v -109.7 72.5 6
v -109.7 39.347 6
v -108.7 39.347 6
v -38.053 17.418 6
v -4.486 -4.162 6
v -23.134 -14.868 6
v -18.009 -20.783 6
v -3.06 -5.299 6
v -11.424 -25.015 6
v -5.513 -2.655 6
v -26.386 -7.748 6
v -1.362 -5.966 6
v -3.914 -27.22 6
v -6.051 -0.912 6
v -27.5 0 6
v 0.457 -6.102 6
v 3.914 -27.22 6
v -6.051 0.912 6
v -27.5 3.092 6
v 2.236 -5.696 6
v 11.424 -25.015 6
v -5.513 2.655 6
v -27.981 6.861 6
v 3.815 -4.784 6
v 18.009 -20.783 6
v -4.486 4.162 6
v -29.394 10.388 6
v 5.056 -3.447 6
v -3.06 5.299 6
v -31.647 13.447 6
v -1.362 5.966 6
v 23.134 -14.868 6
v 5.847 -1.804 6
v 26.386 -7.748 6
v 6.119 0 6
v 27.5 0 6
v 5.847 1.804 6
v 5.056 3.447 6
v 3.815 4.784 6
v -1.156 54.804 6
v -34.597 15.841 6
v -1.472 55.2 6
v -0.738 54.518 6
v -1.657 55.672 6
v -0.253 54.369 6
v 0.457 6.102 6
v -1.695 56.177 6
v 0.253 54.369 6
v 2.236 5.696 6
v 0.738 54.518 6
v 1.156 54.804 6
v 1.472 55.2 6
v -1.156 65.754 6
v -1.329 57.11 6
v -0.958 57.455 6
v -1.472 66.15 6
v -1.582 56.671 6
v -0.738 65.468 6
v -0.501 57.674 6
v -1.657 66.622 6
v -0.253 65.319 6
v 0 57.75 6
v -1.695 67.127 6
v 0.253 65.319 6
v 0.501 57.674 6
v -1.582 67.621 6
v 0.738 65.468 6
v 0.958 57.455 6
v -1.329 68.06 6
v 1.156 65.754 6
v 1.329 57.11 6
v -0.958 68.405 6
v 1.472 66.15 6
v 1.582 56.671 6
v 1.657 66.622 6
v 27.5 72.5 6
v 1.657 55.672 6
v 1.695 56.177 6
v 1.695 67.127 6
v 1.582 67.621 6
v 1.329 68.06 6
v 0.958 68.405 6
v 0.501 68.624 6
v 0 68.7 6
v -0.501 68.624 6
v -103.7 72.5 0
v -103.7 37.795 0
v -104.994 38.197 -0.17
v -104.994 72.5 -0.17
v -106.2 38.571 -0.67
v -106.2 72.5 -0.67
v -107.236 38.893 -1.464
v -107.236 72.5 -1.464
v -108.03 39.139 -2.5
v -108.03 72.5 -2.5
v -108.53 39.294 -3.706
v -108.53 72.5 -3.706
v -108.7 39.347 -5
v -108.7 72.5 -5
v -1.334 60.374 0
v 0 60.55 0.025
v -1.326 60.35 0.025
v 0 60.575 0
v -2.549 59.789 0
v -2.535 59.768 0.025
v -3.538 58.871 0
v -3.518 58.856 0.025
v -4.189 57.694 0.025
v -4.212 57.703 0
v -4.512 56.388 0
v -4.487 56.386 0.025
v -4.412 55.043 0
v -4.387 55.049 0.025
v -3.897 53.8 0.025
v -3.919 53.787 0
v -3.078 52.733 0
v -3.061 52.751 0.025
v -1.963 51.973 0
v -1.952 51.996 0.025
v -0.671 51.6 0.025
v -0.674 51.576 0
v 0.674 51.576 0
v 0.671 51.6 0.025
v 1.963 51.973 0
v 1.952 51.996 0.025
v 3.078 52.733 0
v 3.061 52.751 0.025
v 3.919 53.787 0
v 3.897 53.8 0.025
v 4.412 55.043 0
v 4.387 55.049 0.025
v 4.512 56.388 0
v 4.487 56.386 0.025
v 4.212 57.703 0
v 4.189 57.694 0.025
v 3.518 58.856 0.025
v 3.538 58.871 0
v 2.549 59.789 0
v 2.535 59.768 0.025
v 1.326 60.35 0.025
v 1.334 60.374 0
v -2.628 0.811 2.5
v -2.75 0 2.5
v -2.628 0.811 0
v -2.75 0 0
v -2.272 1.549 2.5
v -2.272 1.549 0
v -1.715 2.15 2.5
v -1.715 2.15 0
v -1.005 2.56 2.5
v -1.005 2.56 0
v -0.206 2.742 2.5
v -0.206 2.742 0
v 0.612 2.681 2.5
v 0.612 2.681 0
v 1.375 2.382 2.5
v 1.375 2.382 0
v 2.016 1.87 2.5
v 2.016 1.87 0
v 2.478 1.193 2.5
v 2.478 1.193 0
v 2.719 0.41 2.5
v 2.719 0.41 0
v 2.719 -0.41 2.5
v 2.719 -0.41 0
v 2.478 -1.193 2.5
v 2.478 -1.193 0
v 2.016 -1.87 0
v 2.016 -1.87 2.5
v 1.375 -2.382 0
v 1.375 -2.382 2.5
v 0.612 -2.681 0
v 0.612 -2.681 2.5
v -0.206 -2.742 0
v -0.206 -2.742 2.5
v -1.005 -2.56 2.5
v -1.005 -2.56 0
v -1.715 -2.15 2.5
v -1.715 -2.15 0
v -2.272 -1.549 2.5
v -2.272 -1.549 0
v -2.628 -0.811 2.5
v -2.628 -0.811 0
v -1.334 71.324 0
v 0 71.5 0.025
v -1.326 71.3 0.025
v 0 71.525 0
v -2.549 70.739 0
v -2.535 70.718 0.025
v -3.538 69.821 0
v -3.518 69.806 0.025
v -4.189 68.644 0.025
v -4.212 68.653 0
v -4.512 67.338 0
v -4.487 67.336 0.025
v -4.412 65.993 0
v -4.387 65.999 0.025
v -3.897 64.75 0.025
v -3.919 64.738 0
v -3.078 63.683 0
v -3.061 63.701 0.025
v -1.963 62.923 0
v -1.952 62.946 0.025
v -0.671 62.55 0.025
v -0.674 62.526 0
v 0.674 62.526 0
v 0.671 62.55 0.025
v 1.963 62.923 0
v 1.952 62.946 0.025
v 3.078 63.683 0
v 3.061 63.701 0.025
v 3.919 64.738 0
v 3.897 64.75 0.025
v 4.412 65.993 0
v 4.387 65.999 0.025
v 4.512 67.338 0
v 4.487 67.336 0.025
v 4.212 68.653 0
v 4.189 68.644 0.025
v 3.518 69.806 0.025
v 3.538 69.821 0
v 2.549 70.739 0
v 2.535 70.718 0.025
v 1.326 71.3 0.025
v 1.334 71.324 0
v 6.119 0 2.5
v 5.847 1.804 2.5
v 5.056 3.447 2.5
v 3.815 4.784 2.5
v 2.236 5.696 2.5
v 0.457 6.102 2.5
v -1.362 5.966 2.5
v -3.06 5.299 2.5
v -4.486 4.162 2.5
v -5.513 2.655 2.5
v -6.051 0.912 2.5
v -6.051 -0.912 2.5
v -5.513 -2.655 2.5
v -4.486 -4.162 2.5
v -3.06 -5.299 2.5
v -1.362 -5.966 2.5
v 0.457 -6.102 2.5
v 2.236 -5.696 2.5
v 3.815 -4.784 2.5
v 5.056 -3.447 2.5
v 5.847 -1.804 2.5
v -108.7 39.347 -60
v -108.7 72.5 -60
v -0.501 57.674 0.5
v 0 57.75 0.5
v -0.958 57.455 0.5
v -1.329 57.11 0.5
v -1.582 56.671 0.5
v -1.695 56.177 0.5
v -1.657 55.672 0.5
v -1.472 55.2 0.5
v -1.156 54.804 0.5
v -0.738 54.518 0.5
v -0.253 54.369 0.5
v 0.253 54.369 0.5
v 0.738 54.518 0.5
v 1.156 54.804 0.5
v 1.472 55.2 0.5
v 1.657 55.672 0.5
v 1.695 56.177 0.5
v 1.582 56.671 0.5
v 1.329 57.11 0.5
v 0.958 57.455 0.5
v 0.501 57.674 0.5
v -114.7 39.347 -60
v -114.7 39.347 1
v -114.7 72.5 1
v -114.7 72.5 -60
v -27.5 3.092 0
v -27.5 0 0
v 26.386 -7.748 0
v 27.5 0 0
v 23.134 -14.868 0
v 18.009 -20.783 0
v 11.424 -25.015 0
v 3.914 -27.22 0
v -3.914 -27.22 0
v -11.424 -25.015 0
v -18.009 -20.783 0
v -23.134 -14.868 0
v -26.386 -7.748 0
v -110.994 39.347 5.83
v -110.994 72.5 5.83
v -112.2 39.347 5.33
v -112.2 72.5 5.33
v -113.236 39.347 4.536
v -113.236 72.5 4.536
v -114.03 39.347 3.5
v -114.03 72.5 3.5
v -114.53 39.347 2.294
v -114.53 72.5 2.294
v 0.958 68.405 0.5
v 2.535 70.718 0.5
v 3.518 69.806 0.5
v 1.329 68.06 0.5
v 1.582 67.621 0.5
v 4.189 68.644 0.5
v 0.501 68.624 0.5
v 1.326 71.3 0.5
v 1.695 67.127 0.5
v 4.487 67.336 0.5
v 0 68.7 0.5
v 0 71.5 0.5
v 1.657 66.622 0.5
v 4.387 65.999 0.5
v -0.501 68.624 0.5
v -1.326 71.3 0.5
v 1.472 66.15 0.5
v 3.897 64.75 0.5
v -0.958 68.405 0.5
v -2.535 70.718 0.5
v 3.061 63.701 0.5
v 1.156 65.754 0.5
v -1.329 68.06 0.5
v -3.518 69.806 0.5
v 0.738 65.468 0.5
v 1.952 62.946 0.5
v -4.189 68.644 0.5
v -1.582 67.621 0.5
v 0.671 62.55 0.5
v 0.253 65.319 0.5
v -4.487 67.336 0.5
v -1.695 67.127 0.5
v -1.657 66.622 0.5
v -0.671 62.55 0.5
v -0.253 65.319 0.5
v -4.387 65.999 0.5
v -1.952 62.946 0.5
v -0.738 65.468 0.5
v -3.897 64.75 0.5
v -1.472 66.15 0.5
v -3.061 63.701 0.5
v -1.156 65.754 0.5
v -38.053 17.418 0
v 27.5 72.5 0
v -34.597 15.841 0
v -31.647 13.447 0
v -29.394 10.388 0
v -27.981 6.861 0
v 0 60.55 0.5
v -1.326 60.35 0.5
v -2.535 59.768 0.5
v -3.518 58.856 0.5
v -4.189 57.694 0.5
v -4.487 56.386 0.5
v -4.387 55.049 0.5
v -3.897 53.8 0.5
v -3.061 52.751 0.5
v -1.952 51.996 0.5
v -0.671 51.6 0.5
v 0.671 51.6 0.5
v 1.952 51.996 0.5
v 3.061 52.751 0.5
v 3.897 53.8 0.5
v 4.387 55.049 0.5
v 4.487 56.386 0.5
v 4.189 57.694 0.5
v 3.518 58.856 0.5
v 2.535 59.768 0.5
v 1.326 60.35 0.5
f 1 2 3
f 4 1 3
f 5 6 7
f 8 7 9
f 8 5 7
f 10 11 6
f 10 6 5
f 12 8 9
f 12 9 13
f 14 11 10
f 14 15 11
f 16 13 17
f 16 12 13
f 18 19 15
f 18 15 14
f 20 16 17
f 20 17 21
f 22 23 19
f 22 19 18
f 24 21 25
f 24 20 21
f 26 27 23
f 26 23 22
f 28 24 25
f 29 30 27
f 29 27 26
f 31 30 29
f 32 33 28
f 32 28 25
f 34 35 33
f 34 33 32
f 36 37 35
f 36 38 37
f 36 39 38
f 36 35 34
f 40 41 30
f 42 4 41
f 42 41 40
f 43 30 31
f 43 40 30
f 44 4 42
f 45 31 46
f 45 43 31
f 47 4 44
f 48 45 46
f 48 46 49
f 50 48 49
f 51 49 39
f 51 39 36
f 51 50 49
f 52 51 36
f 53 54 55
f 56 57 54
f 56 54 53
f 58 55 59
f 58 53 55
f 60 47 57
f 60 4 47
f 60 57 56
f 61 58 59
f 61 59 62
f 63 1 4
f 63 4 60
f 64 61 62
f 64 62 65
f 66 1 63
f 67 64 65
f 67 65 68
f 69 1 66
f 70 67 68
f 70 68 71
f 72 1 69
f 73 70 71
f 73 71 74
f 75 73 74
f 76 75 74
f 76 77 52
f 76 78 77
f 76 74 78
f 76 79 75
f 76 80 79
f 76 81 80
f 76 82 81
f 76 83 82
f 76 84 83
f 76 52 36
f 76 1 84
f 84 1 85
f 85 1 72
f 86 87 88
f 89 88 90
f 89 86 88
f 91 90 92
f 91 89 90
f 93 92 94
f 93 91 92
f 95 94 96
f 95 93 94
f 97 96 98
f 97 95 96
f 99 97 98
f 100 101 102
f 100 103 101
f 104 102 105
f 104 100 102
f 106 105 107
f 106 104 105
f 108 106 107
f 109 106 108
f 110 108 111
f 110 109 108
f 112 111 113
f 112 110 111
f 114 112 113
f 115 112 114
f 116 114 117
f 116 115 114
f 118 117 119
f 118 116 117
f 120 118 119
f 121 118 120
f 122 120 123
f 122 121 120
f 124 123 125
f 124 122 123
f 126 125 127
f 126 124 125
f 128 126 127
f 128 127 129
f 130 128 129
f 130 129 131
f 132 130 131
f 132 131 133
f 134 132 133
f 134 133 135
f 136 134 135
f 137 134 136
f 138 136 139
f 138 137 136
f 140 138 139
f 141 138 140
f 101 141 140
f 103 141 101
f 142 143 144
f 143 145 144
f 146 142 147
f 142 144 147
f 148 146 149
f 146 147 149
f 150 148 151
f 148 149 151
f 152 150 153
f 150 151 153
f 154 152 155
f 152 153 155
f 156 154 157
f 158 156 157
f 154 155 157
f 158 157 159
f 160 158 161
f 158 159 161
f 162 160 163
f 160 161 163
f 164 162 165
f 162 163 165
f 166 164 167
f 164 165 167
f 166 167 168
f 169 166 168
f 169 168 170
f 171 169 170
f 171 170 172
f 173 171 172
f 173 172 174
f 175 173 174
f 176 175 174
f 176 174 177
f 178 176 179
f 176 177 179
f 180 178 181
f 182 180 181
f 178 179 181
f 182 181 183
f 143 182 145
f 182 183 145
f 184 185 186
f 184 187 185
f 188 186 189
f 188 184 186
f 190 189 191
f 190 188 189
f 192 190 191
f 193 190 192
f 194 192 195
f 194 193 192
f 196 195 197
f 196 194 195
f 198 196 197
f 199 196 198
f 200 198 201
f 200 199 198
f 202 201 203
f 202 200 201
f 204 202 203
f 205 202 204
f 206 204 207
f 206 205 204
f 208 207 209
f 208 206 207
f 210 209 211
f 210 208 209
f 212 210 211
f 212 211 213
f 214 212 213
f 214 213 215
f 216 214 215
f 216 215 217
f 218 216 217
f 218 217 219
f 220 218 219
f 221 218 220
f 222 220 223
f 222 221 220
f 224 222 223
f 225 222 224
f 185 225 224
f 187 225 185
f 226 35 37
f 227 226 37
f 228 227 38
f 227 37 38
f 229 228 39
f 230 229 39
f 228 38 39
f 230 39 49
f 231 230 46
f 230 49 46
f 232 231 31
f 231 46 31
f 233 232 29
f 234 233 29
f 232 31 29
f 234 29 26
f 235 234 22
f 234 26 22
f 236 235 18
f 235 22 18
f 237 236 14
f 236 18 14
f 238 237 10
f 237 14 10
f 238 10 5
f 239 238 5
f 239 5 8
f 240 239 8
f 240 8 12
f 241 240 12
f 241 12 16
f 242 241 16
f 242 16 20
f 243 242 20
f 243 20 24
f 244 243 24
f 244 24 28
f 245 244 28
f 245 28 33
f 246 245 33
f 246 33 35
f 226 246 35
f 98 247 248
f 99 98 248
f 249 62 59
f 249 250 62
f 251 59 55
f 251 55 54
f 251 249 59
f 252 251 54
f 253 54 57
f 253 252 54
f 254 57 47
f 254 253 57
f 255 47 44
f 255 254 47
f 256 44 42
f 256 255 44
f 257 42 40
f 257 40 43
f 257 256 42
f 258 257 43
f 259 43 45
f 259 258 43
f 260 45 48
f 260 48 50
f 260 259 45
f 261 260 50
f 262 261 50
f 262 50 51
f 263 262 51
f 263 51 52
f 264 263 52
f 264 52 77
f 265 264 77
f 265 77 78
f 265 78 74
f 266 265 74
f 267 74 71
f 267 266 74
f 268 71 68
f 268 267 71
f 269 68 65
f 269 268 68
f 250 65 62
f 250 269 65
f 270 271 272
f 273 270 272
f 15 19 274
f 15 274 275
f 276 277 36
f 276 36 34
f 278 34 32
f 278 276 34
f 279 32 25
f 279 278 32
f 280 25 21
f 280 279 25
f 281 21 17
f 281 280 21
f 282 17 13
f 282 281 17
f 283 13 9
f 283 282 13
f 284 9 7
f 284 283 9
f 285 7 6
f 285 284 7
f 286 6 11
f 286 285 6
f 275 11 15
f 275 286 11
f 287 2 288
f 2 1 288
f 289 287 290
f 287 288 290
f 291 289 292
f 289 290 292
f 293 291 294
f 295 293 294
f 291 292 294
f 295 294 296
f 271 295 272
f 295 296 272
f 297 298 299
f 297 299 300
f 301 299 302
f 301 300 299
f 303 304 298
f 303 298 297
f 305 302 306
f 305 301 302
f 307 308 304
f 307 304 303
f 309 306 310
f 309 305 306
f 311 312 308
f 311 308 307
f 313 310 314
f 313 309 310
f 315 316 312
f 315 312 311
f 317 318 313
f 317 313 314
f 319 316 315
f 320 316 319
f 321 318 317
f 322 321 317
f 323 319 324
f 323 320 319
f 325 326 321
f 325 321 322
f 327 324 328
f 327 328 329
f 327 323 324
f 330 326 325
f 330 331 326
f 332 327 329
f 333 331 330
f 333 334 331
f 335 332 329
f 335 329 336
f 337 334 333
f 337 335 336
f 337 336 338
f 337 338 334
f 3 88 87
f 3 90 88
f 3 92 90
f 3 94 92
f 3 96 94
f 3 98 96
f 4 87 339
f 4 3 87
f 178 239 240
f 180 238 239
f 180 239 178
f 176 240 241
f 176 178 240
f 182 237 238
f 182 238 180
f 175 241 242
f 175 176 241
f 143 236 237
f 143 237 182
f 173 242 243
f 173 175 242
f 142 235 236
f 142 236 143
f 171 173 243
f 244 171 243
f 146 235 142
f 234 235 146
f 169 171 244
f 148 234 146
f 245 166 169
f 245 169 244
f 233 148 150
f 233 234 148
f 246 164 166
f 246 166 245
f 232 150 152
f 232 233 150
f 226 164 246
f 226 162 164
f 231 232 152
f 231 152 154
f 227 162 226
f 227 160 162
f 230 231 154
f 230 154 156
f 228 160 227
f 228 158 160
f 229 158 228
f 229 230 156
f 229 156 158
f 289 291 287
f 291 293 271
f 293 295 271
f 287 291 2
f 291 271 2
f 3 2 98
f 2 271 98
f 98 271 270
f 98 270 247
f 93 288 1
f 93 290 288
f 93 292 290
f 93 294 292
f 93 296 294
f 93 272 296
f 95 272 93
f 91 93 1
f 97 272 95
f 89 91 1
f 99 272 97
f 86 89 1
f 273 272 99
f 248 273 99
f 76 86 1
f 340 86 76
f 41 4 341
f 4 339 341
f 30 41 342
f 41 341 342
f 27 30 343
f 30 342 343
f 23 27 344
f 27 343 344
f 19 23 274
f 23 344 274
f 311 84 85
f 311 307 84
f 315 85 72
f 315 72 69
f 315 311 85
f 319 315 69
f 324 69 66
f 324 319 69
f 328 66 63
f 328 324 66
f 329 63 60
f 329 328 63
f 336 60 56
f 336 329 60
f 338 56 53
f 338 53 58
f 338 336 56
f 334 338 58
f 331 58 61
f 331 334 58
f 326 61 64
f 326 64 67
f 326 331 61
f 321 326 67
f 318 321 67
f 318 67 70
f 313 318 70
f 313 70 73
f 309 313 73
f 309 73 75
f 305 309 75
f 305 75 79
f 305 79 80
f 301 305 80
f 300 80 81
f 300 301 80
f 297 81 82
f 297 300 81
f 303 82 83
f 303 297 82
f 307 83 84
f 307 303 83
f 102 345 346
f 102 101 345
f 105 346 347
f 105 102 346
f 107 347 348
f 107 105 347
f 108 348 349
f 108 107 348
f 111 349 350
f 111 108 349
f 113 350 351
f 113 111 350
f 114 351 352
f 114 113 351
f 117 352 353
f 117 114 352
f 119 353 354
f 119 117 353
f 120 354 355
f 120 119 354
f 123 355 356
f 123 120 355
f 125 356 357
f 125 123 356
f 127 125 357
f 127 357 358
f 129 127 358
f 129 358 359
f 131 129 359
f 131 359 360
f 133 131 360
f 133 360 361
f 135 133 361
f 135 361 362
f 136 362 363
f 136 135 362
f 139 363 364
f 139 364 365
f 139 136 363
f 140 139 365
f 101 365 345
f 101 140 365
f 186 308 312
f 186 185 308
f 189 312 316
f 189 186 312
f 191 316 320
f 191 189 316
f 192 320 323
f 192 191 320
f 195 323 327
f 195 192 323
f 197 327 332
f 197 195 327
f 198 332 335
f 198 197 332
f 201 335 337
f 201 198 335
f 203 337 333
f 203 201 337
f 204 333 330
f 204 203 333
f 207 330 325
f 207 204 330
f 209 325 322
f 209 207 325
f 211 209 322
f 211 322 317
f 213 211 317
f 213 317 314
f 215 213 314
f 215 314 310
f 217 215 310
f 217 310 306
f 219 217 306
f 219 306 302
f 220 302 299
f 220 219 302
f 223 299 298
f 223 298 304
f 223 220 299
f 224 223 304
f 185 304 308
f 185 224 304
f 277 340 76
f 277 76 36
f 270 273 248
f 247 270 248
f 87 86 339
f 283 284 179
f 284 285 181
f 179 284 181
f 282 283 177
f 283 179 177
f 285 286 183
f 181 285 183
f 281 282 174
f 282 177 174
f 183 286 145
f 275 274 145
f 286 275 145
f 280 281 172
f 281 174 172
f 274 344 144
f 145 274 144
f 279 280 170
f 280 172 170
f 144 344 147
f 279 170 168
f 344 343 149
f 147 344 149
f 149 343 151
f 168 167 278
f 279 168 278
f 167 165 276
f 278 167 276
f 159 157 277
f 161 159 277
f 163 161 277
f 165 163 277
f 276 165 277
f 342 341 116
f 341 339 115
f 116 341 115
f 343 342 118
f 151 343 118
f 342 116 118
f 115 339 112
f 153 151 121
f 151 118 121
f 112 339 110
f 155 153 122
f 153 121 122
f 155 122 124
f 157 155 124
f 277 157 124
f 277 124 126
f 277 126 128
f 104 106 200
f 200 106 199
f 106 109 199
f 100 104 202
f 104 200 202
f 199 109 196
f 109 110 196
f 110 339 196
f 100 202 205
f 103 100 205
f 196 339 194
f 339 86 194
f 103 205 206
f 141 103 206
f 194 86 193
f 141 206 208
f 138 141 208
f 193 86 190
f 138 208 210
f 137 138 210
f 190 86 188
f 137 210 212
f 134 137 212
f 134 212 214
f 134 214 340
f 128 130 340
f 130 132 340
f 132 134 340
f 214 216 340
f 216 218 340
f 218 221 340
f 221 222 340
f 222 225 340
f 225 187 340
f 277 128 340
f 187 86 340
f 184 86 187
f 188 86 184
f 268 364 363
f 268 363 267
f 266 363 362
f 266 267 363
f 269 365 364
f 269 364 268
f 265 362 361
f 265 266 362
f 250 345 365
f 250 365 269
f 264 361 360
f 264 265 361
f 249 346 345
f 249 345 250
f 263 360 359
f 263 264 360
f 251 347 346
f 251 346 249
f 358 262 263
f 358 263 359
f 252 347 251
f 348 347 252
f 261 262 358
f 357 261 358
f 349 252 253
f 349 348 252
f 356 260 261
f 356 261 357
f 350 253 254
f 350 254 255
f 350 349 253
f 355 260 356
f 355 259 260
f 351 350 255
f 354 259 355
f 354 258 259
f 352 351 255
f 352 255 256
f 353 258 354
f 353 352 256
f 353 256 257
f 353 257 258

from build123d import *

# Parameters (mm, degrees)
ESTRUSIONE_ESTRUSIONE1_DEPTH                         = 6
SCHIZZO3_W                                           = 136.2
SCHIZZO3_H                                           = 72.5
ESTRUSIONE_ESTRUSIONE2_DEPTH                         = 6
TAGLIO_ESTRUSIONE1_DEPTH                             = 131.797324132
RACCORDO5_R                                          = 15
ESTRUSIONE_ESTRUSIONE5_DEPTH                         = 6
ESTRUSIONE_ESTRUSIONE5_DEPTH_BACK                    = 60
SCHIZZO9_W                                           = 6
SCHIZZO9_H                                           = 33.15279029
RACCORDO6_R                                          = 5
RACCORDO7_R                                          = 5
FORO_LAMATO_PER_BULLONE_M3_A_TESTA_E_2_COUNT         = 2
FORO_LAMATO_PER_BULLONE_M3_A_TESTA_E_2_PITCH         = 10.95
FORO_LAMATO_PER_BULLONE_M5_A_TESTA_ESAGO_D           = 5.5
FORO_LAMATO_PER_BULLONE_M5_A_TESTA_ESAGO_CBORE_D     = 12.238
FORO_LAMATO_PER_BULLONE_M5_A_TESTA_ESAGO_CBORE_DEPTH = 3.5


with BuildPart() as part:
    # Schizzo2 → Estrusione-Estrusione1 (new body)
    with BuildSketch(Plane.XY):
        with BuildLine():
            Line((-27.5, 0), (-27.5, 45))
            ThreePointArc((-27.5, 45), (0, 72.5), (27.5, 45))
            Line((27.5, 45), (27.5, 0))
            ThreePointArc((27.5, 0), (0, -27.5), (-27.5, 0))
        make_face()
    extrude(amount=ESTRUSIONE_ESTRUSIONE1_DEPTH)

    # Schizzo3 → Estrusione-Estrusione2 (add)
    with BuildSketch(Plane.XY):
        with Locations((-40.6, 36.25)):
            Rectangle(SCHIZZO3_W, SCHIZZO3_H)
    extrude(amount=ESTRUSIONE_ESTRUSIONE2_DEPTH)

    # Schizzo4 → Taglio-Estrusione1 (cut, through all)
    with BuildSketch(Plane.XY.offset(6)):
        Polygon((-27.5, 0), (-108.7, 0), (-108.7, 39.34720971), (-27.5, 14.142426235), align=None)
    extrude(amount=-TAGLIO_ESTRUSIONE1_DEPTH, mode=Mode.SUBTRACT)

    # Raccordo5
    raccordo5_edges = [part.edges().sort_by_distance(p)[0] for p in [
        (-27.5, 14.142426235, 3),
    ]]
    fillet(raccordo5_edges, radius=RACCORDO5_R)

    # Schizzo9 → Estrusione-Estrusione5 (add, two sides: drawn at the far end of the back side and taken through both)
    with BuildSketch(Plane.XY.offset(-ESTRUSIONE_ESTRUSIONE5_DEPTH_BACK)):
        with Locations((-111.7, 55.923604855)):
            Rectangle(SCHIZZO9_W, SCHIZZO9_H)
    extrude(amount=ESTRUSIONE_ESTRUSIONE5_DEPTH + ESTRUSIONE_ESTRUSIONE5_DEPTH_BACK)

    # Raccordo6
    raccordo6_edges = [part.edges().sort_by_distance(p)[0] for p in [
        (-108.7, 55.923604855, 0),
    ]]
    fillet(raccordo6_edges, radius=RACCORDO6_R)

    # Raccordo7
    raccordo7_edges = [part.edges().sort_by_distance(p)[0] for p in [
        (-114.7, 55.923604855, 6),
    ]]
    fillet(raccordo7_edges, radius=RACCORDO7_R)

    # Schizzo20 → Foro lamato per Bullone M3 a testa esagonale-3 (revolve, cut)
    with BuildSketch(Plane(origin=(0, 67, 0), x_dir=(0, 1, 0), z_dir=(1, 0, 0))):
        Polygon((0, 0), (0, 6), (1.7, 6), (1.7, 0.5), (4.5, 0.5), (4.5, 0.025), (4.525, 0), align=None)
    foro_lamato_per_bullone_m3_a_testa_esago = revolve(axis=Axis((0, 67, -6.35), (0, 0, 1)), mode=Mode.SUBTRACT)

    # Foro lamato per Bullone M3 a testa e 2: Foro lamato per Bullone M3 a testa esagonale-3 ×2
    with Locations(*[(0, -i * FORO_LAMATO_PER_BULLONE_M3_A_TESTA_E_2_PITCH, 0) for i in range(1, FORO_LAMATO_PER_BULLONE_M3_A_TESTA_E_2_COUNT)]):
        add(foro_lamato_per_bullone_m3_a_testa_esago, mode=Mode.SUBTRACT)

    # Foro lamato per Bullone M5 a testa esagonale-1 (through all)
    with Locations(Plane.XY.offset(6)):
        with Locations((0, 0)):
            CounterBoreHole(FORO_LAMATO_PER_BULLONE_M5_A_TESTA_ESAGO_D / 2, FORO_LAMATO_PER_BULLONE_M5_A_TESTA_ESAGO_CBORE_D / 2, FORO_LAMATO_PER_BULLONE_M5_A_TESTA_ESAGO_CBORE_DEPTH)


solid = part.part
